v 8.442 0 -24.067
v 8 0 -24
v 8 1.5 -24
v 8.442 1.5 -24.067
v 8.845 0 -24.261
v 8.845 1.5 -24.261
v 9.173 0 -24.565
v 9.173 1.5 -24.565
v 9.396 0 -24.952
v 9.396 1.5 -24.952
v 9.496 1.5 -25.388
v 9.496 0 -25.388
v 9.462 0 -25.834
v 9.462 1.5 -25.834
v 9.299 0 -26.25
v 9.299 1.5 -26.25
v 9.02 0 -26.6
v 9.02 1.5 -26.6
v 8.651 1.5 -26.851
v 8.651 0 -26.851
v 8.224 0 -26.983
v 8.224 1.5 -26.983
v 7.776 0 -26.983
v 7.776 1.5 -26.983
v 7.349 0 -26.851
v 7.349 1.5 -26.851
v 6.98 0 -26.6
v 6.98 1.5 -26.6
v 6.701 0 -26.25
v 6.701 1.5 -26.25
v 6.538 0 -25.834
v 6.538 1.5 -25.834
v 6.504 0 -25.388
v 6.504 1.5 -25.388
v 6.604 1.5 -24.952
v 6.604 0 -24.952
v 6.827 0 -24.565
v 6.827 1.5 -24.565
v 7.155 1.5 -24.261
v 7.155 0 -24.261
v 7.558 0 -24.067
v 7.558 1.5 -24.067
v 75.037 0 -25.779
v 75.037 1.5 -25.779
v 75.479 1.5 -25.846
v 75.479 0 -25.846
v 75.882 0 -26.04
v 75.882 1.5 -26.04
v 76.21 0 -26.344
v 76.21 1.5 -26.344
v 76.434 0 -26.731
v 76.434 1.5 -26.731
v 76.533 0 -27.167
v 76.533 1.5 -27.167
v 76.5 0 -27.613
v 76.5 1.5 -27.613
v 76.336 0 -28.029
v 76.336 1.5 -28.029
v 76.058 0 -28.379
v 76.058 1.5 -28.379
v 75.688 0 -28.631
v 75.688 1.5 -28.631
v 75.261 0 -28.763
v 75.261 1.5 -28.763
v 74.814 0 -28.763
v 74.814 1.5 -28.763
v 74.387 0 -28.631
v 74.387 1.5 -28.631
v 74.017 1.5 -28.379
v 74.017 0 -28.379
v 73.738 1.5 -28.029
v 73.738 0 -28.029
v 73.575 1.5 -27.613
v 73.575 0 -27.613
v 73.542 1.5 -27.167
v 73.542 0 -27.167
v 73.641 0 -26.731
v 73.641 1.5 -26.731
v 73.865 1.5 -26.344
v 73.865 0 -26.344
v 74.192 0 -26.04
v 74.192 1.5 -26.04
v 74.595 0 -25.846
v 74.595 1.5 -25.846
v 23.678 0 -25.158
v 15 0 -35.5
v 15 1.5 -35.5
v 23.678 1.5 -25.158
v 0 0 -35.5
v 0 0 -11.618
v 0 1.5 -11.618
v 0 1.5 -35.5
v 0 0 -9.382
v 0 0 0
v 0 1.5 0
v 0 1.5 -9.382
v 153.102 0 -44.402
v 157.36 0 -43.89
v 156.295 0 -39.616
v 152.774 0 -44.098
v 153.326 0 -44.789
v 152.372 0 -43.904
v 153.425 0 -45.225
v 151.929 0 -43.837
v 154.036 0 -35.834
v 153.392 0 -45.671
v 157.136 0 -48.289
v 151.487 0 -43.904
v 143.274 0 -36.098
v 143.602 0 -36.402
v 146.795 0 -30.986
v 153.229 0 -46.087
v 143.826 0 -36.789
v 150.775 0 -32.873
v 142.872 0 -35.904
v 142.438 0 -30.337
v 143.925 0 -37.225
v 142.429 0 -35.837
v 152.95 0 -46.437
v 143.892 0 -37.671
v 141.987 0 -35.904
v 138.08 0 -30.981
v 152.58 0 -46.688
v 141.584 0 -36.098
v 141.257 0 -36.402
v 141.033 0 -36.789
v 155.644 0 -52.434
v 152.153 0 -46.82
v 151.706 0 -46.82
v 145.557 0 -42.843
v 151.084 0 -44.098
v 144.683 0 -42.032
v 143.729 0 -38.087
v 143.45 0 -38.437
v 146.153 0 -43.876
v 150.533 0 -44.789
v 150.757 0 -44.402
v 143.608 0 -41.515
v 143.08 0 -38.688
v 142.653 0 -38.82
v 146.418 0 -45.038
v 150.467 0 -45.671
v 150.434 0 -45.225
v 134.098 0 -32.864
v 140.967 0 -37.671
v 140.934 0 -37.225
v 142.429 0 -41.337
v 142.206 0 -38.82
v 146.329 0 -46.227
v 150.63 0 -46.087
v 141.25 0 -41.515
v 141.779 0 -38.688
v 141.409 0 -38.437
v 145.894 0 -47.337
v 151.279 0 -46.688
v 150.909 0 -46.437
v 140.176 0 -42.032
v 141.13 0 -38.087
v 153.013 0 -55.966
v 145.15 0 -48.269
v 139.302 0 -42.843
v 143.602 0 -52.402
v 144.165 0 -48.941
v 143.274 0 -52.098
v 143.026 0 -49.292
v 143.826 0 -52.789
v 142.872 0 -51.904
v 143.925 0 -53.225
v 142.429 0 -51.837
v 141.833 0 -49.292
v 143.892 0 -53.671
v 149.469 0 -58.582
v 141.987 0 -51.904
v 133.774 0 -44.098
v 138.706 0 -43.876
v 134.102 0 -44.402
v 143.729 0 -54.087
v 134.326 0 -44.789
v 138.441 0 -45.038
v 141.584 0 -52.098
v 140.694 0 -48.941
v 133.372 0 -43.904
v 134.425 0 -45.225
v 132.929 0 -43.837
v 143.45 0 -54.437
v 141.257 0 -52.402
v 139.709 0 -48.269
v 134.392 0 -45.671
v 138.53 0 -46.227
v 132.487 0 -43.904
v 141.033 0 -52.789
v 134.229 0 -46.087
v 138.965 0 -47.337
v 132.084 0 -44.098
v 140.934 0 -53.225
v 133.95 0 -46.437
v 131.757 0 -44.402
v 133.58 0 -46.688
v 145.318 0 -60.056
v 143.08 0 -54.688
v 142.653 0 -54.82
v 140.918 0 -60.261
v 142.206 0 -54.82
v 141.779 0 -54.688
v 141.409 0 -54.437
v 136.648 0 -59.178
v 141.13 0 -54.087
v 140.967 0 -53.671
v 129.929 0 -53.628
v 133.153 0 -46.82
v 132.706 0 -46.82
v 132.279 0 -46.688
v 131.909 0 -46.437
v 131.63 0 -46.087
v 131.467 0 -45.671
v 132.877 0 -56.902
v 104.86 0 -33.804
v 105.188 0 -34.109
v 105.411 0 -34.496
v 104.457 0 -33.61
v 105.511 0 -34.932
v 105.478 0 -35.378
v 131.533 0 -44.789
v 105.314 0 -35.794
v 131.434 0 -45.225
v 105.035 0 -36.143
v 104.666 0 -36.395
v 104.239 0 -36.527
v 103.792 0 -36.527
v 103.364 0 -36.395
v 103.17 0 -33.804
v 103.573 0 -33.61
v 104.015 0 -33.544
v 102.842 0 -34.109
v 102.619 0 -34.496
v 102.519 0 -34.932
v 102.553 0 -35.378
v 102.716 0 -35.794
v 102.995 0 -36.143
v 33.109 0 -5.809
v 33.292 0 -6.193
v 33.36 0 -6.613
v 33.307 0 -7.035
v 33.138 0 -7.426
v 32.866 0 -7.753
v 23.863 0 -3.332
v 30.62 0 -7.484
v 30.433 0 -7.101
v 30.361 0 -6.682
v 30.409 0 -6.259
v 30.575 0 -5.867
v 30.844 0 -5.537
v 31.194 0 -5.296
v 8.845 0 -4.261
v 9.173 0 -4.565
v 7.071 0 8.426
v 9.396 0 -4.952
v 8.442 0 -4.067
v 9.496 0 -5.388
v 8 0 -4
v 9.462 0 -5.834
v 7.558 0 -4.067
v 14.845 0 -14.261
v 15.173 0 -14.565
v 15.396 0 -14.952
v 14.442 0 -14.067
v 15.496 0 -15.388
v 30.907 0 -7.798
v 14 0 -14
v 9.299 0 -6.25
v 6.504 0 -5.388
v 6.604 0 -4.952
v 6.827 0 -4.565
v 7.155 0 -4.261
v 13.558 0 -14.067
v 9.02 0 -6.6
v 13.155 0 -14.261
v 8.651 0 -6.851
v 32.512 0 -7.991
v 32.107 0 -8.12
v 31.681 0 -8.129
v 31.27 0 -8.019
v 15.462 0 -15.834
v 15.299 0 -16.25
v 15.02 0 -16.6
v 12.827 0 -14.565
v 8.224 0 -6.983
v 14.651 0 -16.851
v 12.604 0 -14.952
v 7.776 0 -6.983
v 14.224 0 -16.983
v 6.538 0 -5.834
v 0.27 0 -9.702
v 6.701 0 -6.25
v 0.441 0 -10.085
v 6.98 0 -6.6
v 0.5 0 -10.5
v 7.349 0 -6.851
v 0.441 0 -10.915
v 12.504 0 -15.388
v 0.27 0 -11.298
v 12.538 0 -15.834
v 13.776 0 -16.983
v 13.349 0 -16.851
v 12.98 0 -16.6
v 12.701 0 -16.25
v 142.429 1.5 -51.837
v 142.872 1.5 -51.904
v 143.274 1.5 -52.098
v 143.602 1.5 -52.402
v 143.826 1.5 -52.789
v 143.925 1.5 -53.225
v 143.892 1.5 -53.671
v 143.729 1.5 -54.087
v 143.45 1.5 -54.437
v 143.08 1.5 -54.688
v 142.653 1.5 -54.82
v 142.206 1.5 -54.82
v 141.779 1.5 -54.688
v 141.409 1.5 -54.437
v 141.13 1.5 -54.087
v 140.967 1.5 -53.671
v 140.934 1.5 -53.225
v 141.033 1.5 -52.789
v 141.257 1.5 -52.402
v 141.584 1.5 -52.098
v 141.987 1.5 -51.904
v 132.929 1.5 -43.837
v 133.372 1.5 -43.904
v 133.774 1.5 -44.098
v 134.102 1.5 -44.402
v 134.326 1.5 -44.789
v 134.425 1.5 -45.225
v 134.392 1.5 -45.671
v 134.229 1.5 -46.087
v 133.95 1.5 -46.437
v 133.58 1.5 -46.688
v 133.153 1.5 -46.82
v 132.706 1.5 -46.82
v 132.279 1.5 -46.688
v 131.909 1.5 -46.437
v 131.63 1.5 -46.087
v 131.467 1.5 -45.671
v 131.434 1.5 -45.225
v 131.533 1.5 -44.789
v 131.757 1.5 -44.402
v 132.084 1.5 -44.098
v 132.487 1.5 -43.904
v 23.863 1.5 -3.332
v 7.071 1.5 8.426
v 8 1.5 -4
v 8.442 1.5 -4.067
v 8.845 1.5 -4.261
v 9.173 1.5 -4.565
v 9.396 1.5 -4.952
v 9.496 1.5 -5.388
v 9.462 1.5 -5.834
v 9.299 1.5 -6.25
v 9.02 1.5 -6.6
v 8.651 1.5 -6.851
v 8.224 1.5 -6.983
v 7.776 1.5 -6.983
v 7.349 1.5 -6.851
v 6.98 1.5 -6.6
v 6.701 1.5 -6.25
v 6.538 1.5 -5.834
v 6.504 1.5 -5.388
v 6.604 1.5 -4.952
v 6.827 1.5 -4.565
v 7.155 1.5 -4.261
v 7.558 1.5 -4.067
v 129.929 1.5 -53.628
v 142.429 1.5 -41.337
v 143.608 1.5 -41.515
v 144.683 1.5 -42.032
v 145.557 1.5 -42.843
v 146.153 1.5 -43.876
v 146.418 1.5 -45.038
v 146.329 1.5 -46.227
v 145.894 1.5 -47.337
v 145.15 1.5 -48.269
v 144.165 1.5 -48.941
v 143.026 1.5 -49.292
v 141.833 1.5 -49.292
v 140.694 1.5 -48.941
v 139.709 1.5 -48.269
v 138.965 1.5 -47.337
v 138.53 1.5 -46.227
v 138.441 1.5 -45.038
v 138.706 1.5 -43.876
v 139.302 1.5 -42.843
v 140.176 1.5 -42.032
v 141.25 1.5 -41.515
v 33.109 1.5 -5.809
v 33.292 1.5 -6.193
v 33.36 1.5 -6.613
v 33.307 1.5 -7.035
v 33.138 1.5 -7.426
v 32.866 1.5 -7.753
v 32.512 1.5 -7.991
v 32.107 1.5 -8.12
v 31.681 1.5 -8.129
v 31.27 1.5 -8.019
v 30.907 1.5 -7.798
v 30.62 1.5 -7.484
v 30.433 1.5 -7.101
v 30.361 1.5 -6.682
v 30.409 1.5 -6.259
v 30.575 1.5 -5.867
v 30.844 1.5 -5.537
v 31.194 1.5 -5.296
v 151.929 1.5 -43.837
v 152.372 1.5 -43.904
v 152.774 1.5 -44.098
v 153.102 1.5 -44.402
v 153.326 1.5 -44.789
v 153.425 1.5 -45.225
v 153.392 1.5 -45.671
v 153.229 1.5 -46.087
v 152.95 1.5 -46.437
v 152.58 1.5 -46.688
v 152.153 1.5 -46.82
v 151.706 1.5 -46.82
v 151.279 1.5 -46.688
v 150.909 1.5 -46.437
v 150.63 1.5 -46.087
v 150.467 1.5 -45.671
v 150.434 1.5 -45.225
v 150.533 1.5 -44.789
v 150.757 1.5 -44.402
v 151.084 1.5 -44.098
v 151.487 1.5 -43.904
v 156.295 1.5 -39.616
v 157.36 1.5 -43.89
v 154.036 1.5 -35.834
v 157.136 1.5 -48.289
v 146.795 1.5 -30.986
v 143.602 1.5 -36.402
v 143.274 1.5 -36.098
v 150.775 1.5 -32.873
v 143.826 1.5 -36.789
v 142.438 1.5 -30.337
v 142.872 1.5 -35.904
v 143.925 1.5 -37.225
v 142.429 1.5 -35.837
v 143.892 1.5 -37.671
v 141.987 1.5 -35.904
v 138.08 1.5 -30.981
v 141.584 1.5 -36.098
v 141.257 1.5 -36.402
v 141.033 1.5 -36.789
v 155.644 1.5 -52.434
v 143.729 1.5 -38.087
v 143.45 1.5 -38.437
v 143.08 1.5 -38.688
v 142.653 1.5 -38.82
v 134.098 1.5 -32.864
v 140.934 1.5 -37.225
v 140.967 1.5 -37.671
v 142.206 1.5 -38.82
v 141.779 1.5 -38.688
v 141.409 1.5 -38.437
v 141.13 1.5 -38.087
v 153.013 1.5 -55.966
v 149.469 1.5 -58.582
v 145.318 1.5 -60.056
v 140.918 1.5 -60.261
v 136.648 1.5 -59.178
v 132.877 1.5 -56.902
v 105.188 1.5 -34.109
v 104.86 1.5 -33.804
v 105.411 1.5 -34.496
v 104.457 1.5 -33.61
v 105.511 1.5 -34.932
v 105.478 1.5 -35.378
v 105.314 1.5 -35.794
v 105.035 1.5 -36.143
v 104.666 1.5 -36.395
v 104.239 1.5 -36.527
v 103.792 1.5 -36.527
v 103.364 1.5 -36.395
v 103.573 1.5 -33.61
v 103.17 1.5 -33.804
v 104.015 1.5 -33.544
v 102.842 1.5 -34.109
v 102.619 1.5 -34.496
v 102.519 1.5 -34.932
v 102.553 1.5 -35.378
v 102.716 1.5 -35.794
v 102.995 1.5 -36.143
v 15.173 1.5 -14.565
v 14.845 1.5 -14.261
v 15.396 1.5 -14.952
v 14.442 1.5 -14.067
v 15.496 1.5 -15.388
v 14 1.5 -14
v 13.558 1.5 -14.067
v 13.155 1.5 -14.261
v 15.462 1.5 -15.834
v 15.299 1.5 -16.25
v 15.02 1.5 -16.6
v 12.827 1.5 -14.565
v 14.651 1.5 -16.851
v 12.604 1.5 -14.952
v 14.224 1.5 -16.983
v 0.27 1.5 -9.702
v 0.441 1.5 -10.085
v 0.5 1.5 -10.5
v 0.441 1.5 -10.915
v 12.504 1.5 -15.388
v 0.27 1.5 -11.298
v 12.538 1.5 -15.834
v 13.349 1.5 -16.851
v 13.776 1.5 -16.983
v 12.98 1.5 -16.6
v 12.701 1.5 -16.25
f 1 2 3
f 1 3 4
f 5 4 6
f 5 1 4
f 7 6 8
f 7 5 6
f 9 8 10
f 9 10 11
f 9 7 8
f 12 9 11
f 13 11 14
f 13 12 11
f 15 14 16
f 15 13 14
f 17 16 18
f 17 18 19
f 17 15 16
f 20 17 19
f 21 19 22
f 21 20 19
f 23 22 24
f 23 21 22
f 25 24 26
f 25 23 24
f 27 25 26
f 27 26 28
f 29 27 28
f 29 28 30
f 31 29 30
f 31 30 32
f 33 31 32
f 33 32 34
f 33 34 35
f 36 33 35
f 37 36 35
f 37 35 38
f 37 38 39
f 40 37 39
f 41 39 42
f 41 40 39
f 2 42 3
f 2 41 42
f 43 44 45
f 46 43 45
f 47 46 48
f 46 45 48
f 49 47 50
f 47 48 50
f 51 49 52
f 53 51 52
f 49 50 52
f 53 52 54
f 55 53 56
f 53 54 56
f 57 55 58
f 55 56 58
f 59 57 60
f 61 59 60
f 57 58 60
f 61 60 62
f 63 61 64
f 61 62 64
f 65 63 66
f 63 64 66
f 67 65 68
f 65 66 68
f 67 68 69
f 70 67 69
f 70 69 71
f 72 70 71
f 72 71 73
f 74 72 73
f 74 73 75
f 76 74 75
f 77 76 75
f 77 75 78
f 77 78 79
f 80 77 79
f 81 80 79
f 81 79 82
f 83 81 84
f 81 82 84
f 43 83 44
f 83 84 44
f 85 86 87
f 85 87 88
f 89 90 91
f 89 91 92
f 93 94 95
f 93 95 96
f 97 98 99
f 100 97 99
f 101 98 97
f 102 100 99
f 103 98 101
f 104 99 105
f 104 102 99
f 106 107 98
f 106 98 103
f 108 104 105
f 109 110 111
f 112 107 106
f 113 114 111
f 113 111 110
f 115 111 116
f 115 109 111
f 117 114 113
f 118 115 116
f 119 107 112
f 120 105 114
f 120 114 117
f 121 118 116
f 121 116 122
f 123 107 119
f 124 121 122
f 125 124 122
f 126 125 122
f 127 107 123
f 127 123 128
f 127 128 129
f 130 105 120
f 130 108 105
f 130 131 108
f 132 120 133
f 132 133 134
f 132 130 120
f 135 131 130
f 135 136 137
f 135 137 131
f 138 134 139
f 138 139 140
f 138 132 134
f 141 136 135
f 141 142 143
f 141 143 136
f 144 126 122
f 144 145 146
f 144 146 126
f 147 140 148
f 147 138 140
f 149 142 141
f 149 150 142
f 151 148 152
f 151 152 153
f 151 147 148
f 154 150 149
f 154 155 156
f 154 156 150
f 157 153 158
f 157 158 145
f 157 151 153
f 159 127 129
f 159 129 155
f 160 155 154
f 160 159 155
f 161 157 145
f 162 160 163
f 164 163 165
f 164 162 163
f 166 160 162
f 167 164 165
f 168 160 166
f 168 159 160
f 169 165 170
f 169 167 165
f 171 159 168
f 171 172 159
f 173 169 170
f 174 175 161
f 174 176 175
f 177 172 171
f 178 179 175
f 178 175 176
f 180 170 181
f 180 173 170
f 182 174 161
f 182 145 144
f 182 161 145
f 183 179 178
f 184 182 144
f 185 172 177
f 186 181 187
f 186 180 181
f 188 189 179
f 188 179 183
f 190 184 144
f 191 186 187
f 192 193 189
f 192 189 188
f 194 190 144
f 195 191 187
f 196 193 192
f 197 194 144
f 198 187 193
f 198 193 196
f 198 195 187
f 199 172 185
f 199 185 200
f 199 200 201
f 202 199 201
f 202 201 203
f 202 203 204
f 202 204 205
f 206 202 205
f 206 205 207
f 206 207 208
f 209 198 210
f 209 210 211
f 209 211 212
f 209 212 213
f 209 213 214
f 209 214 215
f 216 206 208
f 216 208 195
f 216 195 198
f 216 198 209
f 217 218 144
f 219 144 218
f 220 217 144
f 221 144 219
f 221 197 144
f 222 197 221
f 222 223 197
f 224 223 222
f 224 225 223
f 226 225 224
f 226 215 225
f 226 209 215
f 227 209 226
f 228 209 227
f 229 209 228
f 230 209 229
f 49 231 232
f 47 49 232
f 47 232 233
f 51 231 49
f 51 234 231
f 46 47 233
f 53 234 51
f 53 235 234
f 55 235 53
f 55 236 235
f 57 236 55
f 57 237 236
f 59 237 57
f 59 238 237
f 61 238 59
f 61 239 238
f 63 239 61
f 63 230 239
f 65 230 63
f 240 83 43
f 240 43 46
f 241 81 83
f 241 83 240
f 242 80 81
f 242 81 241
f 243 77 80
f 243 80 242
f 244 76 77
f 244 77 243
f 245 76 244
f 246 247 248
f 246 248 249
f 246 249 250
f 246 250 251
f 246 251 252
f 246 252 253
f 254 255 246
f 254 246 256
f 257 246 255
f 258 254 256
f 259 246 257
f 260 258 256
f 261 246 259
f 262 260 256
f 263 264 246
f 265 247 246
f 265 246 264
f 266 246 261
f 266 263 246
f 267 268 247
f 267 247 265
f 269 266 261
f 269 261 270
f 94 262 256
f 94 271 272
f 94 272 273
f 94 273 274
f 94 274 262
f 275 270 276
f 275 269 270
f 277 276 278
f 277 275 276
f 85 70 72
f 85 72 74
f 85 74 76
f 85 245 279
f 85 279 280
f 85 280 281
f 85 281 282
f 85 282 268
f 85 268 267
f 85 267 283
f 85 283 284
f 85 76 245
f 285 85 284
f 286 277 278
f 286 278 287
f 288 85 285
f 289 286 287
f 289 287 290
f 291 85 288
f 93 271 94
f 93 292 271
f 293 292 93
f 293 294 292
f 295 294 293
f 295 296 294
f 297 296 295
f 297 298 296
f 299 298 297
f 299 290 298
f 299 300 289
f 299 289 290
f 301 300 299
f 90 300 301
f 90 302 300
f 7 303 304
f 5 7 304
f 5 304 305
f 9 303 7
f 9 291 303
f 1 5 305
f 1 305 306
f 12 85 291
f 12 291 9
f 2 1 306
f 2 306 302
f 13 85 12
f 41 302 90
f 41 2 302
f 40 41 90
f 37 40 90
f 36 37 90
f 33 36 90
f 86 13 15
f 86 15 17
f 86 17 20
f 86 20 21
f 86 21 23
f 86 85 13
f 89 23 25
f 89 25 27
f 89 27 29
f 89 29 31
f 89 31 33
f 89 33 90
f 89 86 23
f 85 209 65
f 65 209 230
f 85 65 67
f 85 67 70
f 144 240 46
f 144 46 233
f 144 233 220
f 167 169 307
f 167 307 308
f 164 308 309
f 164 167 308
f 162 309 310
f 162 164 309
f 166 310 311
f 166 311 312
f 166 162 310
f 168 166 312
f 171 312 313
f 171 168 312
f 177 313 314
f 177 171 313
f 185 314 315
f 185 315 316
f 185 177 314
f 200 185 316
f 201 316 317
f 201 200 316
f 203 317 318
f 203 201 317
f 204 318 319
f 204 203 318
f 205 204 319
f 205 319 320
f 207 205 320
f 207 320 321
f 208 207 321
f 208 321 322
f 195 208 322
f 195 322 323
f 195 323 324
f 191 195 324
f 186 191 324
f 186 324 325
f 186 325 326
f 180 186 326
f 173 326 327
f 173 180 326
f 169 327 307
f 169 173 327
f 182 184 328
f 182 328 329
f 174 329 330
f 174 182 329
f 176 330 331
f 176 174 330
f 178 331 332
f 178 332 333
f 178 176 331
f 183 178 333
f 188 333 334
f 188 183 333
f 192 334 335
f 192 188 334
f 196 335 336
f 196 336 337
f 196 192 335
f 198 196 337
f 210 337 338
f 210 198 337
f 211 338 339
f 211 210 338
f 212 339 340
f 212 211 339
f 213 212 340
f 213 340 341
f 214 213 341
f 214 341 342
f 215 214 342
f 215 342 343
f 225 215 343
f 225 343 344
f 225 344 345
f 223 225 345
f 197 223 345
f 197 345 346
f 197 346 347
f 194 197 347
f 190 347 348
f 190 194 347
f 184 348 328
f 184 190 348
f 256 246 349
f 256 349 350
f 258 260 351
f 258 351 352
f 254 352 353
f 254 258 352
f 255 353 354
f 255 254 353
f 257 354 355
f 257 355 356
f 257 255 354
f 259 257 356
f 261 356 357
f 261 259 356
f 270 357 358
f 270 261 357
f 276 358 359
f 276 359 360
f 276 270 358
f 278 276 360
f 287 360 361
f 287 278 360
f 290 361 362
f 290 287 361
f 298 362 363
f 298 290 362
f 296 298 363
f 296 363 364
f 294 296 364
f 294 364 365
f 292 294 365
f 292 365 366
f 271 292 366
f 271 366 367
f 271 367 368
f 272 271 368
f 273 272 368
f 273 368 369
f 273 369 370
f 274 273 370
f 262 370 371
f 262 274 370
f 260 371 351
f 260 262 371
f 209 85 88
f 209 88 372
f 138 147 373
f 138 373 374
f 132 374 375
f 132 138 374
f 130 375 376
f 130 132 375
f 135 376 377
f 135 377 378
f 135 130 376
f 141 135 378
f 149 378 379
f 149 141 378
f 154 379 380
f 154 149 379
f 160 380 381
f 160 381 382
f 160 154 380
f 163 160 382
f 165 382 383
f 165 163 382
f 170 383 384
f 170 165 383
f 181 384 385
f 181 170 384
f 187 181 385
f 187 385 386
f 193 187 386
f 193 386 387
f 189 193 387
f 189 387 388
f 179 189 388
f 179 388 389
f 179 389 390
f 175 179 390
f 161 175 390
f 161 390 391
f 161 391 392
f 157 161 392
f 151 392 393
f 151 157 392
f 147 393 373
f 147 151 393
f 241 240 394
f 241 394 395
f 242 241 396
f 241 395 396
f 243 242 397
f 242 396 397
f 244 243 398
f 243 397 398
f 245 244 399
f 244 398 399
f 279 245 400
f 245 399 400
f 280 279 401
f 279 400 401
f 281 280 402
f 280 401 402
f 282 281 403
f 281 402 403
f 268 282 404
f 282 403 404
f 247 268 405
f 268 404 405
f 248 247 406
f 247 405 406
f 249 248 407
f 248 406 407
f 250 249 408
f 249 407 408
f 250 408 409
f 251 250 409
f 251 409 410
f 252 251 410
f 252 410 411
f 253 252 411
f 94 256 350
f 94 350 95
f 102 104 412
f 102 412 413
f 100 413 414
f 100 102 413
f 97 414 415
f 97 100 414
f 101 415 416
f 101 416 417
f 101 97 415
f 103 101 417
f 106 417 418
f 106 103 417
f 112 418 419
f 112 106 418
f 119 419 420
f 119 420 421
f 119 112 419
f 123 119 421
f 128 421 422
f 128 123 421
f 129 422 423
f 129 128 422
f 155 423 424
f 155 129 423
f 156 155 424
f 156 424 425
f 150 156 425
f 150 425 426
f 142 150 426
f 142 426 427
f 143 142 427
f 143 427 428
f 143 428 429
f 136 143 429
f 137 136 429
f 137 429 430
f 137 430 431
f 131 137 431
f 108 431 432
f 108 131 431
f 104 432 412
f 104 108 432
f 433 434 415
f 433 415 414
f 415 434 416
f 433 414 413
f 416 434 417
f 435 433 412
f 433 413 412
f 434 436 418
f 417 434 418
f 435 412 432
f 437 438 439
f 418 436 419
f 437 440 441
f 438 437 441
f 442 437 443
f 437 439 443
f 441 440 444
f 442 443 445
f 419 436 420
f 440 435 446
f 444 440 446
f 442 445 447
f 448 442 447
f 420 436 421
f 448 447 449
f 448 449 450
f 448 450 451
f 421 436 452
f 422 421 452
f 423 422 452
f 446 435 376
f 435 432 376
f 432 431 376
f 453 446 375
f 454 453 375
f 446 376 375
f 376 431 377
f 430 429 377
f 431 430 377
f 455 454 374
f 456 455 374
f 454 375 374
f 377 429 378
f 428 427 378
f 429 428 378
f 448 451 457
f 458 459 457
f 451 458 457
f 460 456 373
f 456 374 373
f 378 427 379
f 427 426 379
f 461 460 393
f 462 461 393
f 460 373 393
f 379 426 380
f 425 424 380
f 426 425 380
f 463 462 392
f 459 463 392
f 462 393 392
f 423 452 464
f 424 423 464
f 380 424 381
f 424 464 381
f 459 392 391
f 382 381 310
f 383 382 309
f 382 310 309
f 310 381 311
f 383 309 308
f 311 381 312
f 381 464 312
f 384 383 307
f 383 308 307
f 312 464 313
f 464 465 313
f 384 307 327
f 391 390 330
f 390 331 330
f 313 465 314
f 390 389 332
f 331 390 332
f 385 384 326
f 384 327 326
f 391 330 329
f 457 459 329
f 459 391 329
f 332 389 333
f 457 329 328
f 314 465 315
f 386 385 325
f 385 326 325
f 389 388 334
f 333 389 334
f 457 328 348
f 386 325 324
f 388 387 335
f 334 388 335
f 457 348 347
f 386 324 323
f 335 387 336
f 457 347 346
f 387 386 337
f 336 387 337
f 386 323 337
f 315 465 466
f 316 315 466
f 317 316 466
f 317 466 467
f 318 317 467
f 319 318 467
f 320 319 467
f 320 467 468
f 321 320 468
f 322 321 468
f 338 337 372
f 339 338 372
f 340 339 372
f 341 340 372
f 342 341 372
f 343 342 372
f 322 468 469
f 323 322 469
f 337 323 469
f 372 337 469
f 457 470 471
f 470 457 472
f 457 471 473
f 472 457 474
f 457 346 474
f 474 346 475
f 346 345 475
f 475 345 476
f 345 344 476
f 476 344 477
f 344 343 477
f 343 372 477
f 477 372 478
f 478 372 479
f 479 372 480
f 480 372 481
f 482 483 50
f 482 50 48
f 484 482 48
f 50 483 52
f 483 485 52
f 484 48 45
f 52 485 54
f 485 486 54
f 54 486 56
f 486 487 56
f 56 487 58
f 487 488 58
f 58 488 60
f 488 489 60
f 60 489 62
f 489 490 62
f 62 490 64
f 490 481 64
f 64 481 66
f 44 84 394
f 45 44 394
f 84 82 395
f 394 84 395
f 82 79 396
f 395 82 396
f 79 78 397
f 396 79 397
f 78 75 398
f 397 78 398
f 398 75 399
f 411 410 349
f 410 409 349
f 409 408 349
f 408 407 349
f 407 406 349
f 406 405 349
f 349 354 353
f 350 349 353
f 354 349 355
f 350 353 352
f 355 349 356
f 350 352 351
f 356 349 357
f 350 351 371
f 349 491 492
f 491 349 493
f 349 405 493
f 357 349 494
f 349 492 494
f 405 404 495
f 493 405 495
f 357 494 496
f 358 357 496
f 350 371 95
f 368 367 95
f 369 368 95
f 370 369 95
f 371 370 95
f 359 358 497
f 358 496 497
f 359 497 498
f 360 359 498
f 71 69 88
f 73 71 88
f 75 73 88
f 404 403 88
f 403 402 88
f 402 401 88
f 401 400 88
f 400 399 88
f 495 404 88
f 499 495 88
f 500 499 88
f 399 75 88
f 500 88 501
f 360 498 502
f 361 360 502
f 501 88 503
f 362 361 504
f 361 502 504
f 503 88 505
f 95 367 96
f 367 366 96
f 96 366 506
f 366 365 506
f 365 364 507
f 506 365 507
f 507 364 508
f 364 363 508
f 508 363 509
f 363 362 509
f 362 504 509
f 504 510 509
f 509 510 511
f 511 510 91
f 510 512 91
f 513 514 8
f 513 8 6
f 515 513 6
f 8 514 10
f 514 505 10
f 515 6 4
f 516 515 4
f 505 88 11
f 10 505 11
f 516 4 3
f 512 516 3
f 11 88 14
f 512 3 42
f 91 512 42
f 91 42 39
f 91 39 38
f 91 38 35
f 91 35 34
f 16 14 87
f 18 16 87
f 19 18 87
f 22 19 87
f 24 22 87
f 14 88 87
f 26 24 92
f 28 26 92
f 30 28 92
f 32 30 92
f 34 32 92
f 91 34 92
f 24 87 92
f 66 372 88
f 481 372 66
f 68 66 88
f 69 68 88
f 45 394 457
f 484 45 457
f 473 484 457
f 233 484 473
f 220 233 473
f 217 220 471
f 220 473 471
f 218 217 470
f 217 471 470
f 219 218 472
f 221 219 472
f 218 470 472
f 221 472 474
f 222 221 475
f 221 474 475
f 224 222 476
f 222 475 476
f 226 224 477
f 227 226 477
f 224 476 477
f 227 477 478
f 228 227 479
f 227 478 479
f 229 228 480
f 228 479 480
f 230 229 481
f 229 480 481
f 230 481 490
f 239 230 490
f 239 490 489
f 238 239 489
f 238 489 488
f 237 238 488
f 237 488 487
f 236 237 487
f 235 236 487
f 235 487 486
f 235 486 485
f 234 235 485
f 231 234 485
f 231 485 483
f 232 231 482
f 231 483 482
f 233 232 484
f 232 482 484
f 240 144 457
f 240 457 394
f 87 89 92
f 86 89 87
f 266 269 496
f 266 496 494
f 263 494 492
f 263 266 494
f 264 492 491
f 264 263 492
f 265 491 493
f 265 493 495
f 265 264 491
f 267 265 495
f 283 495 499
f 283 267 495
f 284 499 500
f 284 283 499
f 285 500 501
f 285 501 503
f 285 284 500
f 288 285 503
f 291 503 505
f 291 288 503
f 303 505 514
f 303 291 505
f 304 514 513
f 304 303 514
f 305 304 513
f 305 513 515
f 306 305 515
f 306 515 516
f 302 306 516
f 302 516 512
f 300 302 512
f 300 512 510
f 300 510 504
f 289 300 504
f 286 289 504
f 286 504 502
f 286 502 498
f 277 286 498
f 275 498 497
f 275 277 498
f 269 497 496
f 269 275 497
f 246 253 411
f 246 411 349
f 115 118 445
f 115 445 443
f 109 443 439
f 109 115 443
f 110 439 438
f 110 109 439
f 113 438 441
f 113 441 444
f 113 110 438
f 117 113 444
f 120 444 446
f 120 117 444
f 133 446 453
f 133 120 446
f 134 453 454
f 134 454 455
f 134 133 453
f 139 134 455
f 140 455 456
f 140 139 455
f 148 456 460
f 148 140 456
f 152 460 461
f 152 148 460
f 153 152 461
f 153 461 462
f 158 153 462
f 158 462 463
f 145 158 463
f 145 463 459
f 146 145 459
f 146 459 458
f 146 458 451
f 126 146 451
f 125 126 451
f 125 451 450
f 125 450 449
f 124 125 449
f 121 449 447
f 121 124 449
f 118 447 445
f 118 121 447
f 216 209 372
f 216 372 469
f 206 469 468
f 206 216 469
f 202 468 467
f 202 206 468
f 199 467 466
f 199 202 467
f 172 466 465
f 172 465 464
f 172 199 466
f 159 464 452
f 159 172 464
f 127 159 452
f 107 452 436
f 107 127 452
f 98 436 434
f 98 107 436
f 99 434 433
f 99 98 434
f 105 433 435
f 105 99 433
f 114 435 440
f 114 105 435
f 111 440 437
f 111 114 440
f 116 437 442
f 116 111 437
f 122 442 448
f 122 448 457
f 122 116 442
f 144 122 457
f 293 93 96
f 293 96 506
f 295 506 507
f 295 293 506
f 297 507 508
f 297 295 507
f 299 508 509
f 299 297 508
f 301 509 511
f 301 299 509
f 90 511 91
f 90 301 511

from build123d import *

# Parameters (mm, degrees)
SKETCH2_R           = 4
SKETCH2_R_2         = 1.5
BOSS_EXTRUDE1_DEPTH = 1.5
SKETCH3_R           = 1.5
CUT_EXTRUDE1_DEPTH  = 1.5
SKETCH4_R           = 1.5
CUT_EXTRUDE2_DEPTH  = 1.5


with BuildPart() as part:
    # Sketch2 → Boss-Extrude1 (new body)
    with BuildSketch(Plane(origin=(0, 0, 0), x_dir=(1, 0, 0), z_dir=(0, 1, 0))):
        with BuildLine():
            Line((0, 0), (0, 9.381966011))
            ThreePointArc((0, 9.381966011), (0.5, 10.5), (0, 11.618033989))
            Line((0, 11.618033989), (0, 35.5))
            Line((0, 35.5), (15, 35.5))
            Line((15, 35.5), (23.677632731, 25.158400018))
            Line((23.677632731, 25.158400018), (129.929473623, 53.628494979))
            ThreePointArc((129.929473623, 53.628494979), (157.136079306, 48.289177788), (134.097880355, 32.863579259))
            Line((134.097880355, 32.863579259), (23.863280614, 3.331828071))
            Line((23.863280614, 3.331828071), (7.070663707, -8.426488874))
            Line((7.070663707, -8.426488874), (0, 0))
        make_face()
        with Locations(Location((142.429473623, 45.336933003, 0), (0, 0, 270))):
            Circle(SKETCH2_R, mode=Mode.SUBTRACT)
        with Locations(Location((8, 25.5, 0), (0, 0, 270))):
            Circle(SKETCH2_R_2, mode=Mode.SUBTRACT)
        with Locations(Location((14, 15.5, 0), (0, 0, 270))):
            Circle(SKETCH2_R_2, mode=Mode.SUBTRACT)
        with Locations(Location((8, 5.5, 0), (0, 0, 270))):
            Circle(SKETCH2_R_2, mode=Mode.SUBTRACT)
        with Locations(Location((142.429473623, 53.336933003, 0), (0, 0, 270))):
            Circle(SKETCH2_R_2, mode=Mode.SUBTRACT)
        with Locations(Location((151.929473623, 45.336933003, 0), (0, 0, 270))):
            Circle(SKETCH2_R_2, mode=Mode.SUBTRACT)
        with Locations(Location((142.429473623, 37.336933003, 0), (0, 0, 270))):
            Circle(SKETCH2_R_2, mode=Mode.SUBTRACT)
        with Locations(Location((132.929473623, 45.336933003, 0), (0, 0, 270))):
            Circle(SKETCH2_R_2, mode=Mode.SUBTRACT)
    extrude(amount=BOSS_EXTRUDE1_DEPTH)

    # Sketch3 → Cut-Extrude1 (cut)
    with BuildSketch(Plane(origin=(0, 1.5, 0), x_dir=(1, 0, 0), z_dir=(0, 1, 0))):
        with Locations((31.86, 6.64)):
            Circle(SKETCH3_R)
    extrude(amount=-CUT_EXTRUDE1_DEPTH, mode=Mode.SUBTRACT)

    # Sketch4 → Cut-Extrude2 (cut)
    with BuildSketch(Plane(origin=(0, 1.5, 0), x_dir=(1, 0, 0), z_dir=(0, 1, 0))):
        with Locations(Location((75.037341097, 27.279265517, 0), (0, 0, 270))):
            Circle(SKETCH4_R)
        with Locations(Location((104.015115886, 35.04383687, 0), (0, 0, 270))):
            Circle(SKETCH4_R)
    extrude(amount=-CUT_EXTRUDE2_DEPTH, mode=Mode.SUBTRACT)


solid = part.part
